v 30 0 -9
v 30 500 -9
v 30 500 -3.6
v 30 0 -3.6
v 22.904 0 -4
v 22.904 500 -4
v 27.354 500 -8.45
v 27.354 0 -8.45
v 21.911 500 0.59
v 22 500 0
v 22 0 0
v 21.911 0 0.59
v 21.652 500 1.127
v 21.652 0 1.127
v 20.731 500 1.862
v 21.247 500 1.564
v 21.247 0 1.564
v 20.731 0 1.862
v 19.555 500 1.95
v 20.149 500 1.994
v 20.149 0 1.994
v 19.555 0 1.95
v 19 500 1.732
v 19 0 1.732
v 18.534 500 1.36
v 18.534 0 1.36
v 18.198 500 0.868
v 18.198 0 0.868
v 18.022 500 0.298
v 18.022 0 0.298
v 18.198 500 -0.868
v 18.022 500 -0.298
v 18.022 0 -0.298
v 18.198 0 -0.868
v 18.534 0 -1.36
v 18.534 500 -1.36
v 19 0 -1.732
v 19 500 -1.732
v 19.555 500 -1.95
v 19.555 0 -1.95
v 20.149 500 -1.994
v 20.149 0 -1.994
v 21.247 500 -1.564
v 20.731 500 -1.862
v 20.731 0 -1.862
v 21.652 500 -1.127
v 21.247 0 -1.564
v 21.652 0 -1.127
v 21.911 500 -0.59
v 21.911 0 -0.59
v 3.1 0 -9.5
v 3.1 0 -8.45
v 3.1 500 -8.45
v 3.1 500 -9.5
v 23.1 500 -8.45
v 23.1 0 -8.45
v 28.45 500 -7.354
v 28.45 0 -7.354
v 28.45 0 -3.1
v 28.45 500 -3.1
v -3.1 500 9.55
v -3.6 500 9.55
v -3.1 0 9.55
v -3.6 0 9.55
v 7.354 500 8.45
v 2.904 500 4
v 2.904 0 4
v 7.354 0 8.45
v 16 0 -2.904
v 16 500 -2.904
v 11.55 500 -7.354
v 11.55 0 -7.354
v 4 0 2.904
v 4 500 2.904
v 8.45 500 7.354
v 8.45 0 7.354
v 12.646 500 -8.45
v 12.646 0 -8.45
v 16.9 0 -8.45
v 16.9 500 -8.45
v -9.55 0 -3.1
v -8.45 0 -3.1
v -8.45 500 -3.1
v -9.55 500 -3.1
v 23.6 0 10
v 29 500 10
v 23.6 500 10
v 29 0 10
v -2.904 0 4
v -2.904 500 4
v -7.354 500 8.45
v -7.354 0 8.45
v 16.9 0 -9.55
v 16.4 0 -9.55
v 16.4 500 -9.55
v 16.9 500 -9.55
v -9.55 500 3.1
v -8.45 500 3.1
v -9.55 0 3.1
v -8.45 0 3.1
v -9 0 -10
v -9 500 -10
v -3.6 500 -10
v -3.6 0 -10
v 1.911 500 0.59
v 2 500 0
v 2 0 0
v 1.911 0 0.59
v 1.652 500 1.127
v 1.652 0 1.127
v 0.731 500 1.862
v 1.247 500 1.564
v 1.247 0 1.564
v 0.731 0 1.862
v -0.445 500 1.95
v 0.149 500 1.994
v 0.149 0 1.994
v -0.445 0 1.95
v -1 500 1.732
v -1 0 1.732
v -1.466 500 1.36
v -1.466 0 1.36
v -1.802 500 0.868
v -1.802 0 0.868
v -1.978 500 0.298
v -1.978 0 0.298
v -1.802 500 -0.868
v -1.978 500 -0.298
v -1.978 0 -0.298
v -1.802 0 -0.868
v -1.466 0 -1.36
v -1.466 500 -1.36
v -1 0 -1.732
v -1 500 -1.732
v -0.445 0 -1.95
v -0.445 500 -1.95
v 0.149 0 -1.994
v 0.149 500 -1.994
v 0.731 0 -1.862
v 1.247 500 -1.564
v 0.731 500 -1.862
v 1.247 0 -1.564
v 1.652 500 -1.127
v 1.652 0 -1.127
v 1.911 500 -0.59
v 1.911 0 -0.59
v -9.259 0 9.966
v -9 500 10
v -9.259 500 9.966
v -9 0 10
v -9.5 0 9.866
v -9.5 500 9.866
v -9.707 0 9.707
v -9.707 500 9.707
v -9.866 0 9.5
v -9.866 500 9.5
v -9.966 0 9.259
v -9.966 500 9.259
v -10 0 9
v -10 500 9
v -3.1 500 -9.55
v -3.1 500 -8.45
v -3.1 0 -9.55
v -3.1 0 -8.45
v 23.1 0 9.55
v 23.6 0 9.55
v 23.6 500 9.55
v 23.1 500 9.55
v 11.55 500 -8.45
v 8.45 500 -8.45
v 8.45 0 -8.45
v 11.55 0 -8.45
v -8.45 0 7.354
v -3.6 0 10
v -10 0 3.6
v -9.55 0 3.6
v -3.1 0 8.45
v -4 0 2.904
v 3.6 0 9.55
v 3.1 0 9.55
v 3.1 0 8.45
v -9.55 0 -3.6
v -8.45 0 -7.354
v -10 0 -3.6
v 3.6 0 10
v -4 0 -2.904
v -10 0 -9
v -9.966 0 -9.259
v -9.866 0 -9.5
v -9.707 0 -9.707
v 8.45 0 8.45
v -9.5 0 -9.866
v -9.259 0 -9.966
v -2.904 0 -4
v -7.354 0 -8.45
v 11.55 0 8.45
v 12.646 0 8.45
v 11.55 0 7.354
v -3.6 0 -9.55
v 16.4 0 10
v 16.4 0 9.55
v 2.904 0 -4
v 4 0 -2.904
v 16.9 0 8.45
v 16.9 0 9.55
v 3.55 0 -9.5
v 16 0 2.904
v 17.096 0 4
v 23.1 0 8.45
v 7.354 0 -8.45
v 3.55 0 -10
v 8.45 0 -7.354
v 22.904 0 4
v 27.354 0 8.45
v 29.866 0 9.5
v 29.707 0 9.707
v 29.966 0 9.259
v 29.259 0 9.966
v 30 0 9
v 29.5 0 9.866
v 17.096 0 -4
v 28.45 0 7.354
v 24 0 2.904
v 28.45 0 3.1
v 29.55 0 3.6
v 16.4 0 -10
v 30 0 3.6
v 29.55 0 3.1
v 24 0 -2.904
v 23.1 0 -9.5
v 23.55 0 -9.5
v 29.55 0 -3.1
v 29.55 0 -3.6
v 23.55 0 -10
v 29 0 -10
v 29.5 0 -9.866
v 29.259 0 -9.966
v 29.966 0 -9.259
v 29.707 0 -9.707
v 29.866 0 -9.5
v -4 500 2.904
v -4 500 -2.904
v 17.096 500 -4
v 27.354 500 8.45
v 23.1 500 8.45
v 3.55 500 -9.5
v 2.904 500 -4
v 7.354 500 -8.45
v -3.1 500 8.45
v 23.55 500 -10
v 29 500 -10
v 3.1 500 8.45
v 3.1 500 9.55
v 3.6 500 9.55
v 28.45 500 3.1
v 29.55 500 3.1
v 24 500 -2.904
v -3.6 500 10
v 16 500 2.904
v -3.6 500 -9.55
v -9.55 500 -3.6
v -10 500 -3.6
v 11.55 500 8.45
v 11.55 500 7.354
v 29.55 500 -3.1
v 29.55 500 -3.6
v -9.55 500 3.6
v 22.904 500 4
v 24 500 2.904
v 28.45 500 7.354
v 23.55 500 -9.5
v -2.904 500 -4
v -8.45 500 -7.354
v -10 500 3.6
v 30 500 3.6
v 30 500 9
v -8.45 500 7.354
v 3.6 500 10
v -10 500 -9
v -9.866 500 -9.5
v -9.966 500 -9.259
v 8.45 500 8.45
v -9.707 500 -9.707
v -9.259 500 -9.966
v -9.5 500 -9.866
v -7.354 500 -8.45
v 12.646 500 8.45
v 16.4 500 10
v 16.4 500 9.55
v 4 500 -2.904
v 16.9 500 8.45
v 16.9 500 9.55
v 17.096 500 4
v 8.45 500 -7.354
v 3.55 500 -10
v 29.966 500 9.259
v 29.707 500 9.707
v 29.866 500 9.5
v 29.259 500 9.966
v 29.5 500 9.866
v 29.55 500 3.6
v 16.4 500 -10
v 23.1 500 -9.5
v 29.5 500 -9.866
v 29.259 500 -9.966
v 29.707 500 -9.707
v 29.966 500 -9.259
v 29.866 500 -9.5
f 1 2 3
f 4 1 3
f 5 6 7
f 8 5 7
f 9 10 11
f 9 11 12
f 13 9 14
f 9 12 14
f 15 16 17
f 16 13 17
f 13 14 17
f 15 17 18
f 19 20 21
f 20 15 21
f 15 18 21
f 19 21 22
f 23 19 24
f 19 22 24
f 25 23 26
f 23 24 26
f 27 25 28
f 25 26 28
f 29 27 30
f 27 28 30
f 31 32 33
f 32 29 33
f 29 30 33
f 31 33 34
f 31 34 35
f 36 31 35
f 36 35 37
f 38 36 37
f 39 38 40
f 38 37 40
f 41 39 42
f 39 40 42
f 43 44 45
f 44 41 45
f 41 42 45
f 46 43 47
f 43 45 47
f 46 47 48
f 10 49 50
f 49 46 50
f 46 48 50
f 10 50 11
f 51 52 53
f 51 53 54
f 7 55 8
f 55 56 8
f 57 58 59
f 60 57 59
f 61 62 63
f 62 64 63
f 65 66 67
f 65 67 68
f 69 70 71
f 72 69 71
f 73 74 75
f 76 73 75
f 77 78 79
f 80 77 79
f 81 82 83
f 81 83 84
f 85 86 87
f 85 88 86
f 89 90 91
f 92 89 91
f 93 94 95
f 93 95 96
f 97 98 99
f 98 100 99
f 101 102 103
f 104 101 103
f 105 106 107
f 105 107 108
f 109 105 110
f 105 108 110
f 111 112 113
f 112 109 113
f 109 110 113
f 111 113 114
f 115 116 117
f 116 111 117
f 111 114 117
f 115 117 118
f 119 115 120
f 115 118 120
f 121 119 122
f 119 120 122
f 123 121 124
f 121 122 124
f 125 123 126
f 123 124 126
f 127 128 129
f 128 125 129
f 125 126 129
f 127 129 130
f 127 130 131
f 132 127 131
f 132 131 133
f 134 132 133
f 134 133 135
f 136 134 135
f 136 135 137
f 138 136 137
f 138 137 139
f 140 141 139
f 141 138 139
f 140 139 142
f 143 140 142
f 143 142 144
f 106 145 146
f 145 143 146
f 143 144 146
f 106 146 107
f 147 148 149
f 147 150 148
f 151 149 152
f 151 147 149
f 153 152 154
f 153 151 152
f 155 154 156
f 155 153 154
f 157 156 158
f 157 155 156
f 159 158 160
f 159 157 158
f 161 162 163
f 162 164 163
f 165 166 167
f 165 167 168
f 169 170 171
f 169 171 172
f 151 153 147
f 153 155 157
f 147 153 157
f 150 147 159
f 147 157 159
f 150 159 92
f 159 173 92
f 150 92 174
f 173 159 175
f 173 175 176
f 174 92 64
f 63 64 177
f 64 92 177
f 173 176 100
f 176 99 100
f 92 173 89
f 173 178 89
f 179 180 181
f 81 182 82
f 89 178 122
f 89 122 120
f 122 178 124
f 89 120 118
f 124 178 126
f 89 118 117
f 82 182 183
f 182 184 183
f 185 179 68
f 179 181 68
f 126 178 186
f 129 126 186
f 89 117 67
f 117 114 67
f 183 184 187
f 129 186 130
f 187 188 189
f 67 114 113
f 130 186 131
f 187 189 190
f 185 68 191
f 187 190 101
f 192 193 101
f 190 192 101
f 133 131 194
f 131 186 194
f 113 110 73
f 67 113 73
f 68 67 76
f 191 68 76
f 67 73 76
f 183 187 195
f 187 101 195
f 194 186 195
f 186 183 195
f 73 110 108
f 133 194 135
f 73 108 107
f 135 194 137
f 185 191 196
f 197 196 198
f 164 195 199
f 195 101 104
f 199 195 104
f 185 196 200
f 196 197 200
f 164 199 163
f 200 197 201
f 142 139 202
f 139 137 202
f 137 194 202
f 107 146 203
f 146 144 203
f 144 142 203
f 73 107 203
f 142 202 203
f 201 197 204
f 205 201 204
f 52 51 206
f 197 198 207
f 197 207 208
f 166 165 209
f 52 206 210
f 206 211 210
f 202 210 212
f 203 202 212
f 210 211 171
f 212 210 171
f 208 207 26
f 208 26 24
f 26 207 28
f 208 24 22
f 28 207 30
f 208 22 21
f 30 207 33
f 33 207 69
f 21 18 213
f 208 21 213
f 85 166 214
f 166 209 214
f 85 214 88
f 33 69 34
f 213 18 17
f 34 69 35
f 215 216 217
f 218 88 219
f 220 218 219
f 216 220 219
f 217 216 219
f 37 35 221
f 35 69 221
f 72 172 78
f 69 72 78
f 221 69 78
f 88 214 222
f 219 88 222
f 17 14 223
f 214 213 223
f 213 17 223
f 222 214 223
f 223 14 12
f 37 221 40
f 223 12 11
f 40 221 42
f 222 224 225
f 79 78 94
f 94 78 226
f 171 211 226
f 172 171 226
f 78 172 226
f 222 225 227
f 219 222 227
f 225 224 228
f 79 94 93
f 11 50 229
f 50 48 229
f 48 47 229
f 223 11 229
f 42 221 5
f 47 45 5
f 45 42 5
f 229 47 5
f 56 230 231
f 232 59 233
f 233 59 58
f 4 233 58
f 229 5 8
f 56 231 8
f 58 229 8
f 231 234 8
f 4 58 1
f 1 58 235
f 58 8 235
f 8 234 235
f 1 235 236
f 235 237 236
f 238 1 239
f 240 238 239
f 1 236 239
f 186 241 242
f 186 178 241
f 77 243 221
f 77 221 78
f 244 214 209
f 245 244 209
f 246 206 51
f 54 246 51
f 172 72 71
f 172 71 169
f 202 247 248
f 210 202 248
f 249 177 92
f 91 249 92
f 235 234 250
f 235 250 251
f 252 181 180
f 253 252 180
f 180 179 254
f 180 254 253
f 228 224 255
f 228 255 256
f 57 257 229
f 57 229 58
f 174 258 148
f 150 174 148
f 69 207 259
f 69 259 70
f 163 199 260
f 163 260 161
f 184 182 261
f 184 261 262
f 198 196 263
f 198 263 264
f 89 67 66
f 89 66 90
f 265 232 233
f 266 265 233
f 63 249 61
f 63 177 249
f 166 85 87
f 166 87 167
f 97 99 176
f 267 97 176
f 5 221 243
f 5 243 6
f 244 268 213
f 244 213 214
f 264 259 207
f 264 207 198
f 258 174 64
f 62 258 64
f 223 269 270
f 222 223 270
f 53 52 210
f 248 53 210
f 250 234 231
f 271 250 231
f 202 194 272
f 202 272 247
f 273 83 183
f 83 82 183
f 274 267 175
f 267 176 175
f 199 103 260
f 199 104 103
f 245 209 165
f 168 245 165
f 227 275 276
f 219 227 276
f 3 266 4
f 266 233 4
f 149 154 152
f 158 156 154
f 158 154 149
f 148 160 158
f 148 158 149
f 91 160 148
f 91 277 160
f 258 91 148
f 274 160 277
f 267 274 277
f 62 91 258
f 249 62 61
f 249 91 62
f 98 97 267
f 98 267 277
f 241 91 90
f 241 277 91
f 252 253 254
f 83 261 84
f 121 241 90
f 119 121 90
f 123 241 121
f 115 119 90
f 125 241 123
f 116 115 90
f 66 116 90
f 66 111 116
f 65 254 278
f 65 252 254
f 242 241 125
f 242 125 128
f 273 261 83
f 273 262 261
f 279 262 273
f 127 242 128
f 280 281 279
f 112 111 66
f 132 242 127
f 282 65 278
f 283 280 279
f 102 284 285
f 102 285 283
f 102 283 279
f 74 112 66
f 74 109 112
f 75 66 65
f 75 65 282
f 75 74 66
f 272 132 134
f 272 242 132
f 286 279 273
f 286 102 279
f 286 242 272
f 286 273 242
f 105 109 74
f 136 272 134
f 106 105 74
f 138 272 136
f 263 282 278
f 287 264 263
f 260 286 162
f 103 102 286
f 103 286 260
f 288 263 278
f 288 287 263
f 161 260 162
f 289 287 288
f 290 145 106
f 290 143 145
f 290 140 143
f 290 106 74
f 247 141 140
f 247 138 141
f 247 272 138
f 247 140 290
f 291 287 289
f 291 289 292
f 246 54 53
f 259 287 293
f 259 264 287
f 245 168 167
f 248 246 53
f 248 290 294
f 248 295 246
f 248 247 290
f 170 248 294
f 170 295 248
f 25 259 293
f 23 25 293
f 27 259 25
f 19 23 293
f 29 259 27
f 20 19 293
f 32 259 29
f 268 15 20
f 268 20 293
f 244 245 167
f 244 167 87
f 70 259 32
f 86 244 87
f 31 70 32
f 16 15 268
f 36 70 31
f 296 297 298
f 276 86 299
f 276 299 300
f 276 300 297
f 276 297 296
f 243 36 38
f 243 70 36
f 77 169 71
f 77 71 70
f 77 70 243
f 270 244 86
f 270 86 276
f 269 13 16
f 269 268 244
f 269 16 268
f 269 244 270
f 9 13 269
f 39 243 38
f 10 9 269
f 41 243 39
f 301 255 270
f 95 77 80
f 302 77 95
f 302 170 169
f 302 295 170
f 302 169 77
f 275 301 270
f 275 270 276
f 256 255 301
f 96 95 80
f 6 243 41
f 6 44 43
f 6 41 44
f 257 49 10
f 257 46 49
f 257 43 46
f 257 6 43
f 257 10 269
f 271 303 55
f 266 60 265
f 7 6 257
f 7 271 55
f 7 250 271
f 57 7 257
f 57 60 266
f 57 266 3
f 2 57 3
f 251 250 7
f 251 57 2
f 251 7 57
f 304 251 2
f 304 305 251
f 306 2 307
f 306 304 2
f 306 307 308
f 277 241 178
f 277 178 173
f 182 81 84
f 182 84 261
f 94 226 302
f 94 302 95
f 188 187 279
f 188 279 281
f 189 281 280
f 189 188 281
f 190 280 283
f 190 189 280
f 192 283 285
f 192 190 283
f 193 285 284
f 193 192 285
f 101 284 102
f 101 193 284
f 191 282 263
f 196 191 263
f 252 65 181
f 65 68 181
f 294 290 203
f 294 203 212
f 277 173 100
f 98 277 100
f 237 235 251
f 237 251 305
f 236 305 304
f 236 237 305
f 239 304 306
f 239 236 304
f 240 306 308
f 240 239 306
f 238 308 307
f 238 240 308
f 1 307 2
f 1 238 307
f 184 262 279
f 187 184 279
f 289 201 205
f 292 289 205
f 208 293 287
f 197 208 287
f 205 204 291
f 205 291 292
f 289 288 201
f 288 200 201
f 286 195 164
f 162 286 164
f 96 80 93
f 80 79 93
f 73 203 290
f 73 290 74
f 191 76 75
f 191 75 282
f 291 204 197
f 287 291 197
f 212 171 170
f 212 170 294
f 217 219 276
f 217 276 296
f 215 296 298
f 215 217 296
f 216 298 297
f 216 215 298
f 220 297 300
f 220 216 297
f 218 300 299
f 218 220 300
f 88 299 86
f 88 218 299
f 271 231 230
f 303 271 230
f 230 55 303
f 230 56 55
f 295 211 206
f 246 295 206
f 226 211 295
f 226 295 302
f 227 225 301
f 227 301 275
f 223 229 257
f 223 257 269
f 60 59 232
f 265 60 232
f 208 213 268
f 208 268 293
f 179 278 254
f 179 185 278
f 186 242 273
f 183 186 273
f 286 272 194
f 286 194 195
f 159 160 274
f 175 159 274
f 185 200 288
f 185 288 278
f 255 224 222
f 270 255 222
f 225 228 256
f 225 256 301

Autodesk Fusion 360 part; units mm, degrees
sketch "Sketch1" plane through (0, 0, 0) normal (0, 1, 0) x (1, 0, 0)
  line L0 (9, -10) -> (-9, -10)
  line L1 (-10, -9) -> (-10, 9)
  line L2 (-9, 10) -> (9, 10)
  line L3 (10, 9) -> (10, -9)
  line L4 (10, -10) -> (-10, 10) construction
  line L5 (-10, -10) -> (10, 10) construction
  line L6 (4, -4) -> (-4, -4)
  line L7 (-4, -4) -> (-4, 4)
  line L8 (-4, 4) -> (4, 4)
  line L9 (4, 4) -> (4, -4)
  line L10 (4, -4) -> (-4, 4) construction
  line L11 (-4, -4) -> (4, 4) construction
  circle A0 centre (0, 0) radius 2
  line L12 (8.45, -8.45) -> (-8.45, -8.45)
  line L13 (-8.45, -8.45) -> (-8.45, 8.45)
  line L14 (-8.45, 8.45) -> (8.45, 8.45)
  line L15 (8.45, 8.45) -> (8.45, -8.45)
  line L16 (8.45, -8.45) -> (-8.45, 8.45) construction
  line L17 (-8.45, -8.45) -> (8.45, 8.45) construction
  line L18 (-9.452, -10.548) -> (10.548, 9.452) construction
  line L19 (-10.548, -9.452) -> (9.452, 10.548) construction
  line L20 (10.548, -9.452) -> (-9.452, 10.548) construction
  line L21 (9.452, -10.548) -> (-10.548, 9.452) construction
  line L22 (3.1, -10) -> (-3.1, -10) construction
  line L23 (-3.1, -10) -> (-3.1, 10) construction
  line L24 (-3.1, 10) -> (3.1, 10) construction
  line L25 (3.1, 10) -> (3.1, -10) construction
  line L26 (10, -3.1) -> (-10, -3.1) construction
  line L27 (-10, -3.1) -> (-10, 3.1) construction
  line L28 (-10, 3.1) -> (10, 3.1) construction
  line L29 (10, 3.1) -> (10, -3.1) construction
  line L30 (-3.1, -8.45) -> (-3.1, -10)
  line L31 (3.1, -8.45) -> (3.1, -10)
  line L32 (-8.45, -3.1) -> (-10, -3.1)
  line L33 (-8.45, 3.1) -> (-10, 3.1)
  line L34 (8.45, -3.1) -> (10, -3.1)
  line L35 (8.45, 3.1) -> (10, 3.1)
  line L36 (-3.1, 8.45) -> (-3.1, 10)
  line L37 (3.1, 8.45) -> (3.1, 10)
  line L38 (-4, 2.904) -> (-8.45, 7.354)
  line L39 (-2.904, 4) -> (-7.354, 8.45)
  line L40 (2.904, 4) -> (7.354, 8.45)
  line L41 (4, 2.904) -> (8.45, 7.354)
  line L42 (-4, -2.904) -> (-8.45, -7.354)
  line L43 (-2.904, -4) -> (-7.354, -8.45)
  line L44 (2.904, -4) -> (7.354, -8.45)
  line L45 (4, -2.904) -> (8.45, -7.354)
  line L46 (-10, -3.1) -> (-9.55, -3.1)
  line L47 (-9.55, -3.1) -> (-9.55, -3.6)
  line L48 (-9.55, -3.6) -> (-10, -3.6)
  line L49 (-10, -3.6) -> (-10, -3.1)
  line L50 (-10, 3.1) -> (-9.55, 3.1)
  line L51 (-9.55, 3.1) -> (-9.55, 3.6)
  line L52 (-9.55, 3.6) -> (-10, 3.6)
  line L53 (-10, 3.6) -> (-10, 3.1)
  line L54 (-3.1, -10) -> (-3.6, -10)
  line L55 (-3.6, -10) -> (-3.6, -9.55)
  line L56 (-3.6, -9.55) -> (-3.1, -9.55)
  line L57 (-3.1, -9.55) -> (-3.1, -10)
  line L58 (3.1, -10) -> (3.6, -10)
  line L59 (3.6, -10) -> (3.6, -9.55)
  line L60 (3.6, -9.55) -> (3.1, -9.55)
  line L61 (3.1, -9.55) -> (3.1, -10)
  line L62 (10, -3.1) -> (9.55, -3.1)
  line L63 (9.55, -3.1) -> (9.55, -3.6)
  line L64 (9.55, -3.6) -> (10, -3.6)
  line L65 (10, -3.6) -> (10, -3.1)
  line L66 (10, 3.1) -> (9.55, 3.1)
  line L67 (9.55, 3.1) -> (9.55, 3.6)
  line L68 (9.55, 3.6) -> (10, 3.6)
  line L69 (10, 3.6) -> (10, 3.1)
  line L70 (-3.1, 10) -> (-3.6, 10)
  line L71 (-3.6, 10) -> (-3.6, 9.55)
  line L72 (-3.6, 9.55) -> (-3.1, 9.55)
  line L73 (-3.1, 9.55) -> (-3.1, 10)
  line L74 (3.1, 10) -> (3.55, 10)
  line L75 (3.55, 10) -> (3.55, 9.5)
  line L76 (3.55, 9.5) -> (3.1, 9.5)
  line L77 (3.1, 9.5) -> (3.1, 10)
  arc A1 (-10, -9) -> (-9, -10) centre (-9, -9) ccw
  arc A2 (9, -10) -> (10, -9) centre (9, -9) ccw
  arc A3 (10, 9) -> (9, 10) centre (9, 9) ccw
  arc A4 (-9, 10) -> (-10, 9) centre (-9, 9) ccw
  arc A5 (29, -10) -> (30, -9) centre (29, -9) ccw
  line L78 (30, -3.1) -> (10, -3.1) construction
  line L79 (30, 9) -> (30, -9)
  line L80 (24, 4) -> (24, -4)
  line L81 (29.452, -10.548) -> (9.452, 9.452) construction
  line L82 (30, 3.1) -> (29.55, 3.1)
  line L83 (29, -10) -> (11, -10)
  line L84 (16, 4) -> (24, 4)
  line L85 (24, -4) -> (16, 4) construction
  line L86 (28.45, -8.45) -> (11.55, -8.45)
  circle A6 centre (20, 0) radius 2
  line L87 (10, -9) -> (10, 9)
  line L88 (10, -3.1) -> (10, 3.1) construction
  line L89 (16.9, 8.45) -> (16.9, 10)
  arc A7 (11, 10) -> (10, 9) centre (11, 9) ccw
  line L90 (17.096, -4) -> (12.646, -8.45)
  line L91 (16.9, -8.45) -> (16.9, -10)
  line L92 (16.4, -9.55) -> (16.9, -9.55)
  line L93 (10, -3.1) -> (10.45, -3.1)
  line L94 (10, 3.1) -> (10.45, 3.1)
  line L95 (10.45, 3.1) -> (10.45, 3.6)
  arc A8 (10, -9) -> (11, -10) centre (11, -9) ccw
  line L96 (10.45, -3.1) -> (10.45, -3.6)
  line L97 (16.9, -10) -> (16.9, 10) construction
  line L98 (10.45, -3.6) -> (10, -3.6)
  line L99 (29.55, 3.1) -> (29.55, 3.6)
  line L100 (16, -4) -> (16, 4)
  line L101 (23.1, -9.55) -> (23.1, -10)
  line L102 (28.45, -3.1) -> (30, -3.1)
  line L103 (30, -3.6) -> (30, -3.1)
  line L104 (22.904, -4) -> (27.354, -8.45)
  line L105 (22.904, 4) -> (27.354, 8.45)
  line L106 (23.1, 10) -> (23.1, -10) construction
  line L107 (16, -2.904) -> (11.55, -7.354)
  line L108 (16, 2.904) -> (11.55, 7.354)
  line L109 (16.4, 10) -> (16.4, 9.55)
  line L110 (17.096, 4) -> (12.646, 8.45)
  line L111 (10, -3.6) -> (10, -3.1)
  line L112 (16.9, -9.55) -> (16.9, -10)
  line L113 (23.1, 9.5) -> (23.1, 10)
  line L114 (23.6, -10) -> (23.6, -9.55)
  line L115 (10.45, 3.6) -> (10, 3.6)
  line L116 (24, -2.904) -> (28.45, -7.354)
  line L117 (23.55, 10) -> (23.55, 9.5)
  line L118 (10, 3.6) -> (10, 3.1)
  line L119 (11.55, 3.1) -> (10, 3.1)
  line L120 (11.55, -8.45) -> (11.55, 8.45)
  line L121 (23.1, -10) -> (23.6, -10)
  line L122 (11.55, -3.1) -> (10, -3.1)
  line L123 (29.55, -3.6) -> (30, -3.6)
  line L124 (16.4, 9.55) -> (16.9, 9.55)
  line L125 (23.1, 10) -> (23.55, 10)
  line L126 (16.9, 10) -> (16.4, 10)
  line L127 (16.4, -10) -> (16.4, -9.55)
  line L128 (10, 3.1) -> (30, 3.1) construction
  line L129 (24, 2.904) -> (28.45, 7.354)
  line L130 (23.55, 9.5) -> (23.1, 9.5)
  line L131 (23.1, -8.45) -> (23.1, -10)
  line L132 (16.9, 9.55) -> (16.9, 10)
  line L133 (23.1, -10) -> (16.9, -10) construction
  line L134 (30, -3.1) -> (29.55, -3.1)
  line L135 (30.548, -9.452) -> (10.548, 10.548) construction
  line L136 (23.6, -9.55) -> (23.1, -9.55)
  line L137 (29.55, -3.1) -> (29.55, -3.6)
  line L138 (16.9, 10) -> (23.1, 10) construction
  line L139 (30, 3.1) -> (30, -3.1) construction
  line L140 (23.1, 8.45) -> (23.1, 10)
  line L141 (16.9, -10) -> (16.4, -10)
  line L142 (24, -4) -> (16, -4)
  line L143 (16, -4) -> (24, 4) construction
  line L144 (10, -10) -> (30, 10) construction
  arc A9 (30, 9) -> (29, 10) centre (29, 9) ccw
  line L145 (11, 10) -> (29, 10)
  line L146 (28.45, 8.45) -> (28.45, -8.45)
  line L147 (9.452, -9.452) -> (29.452, 10.548) construction
  line L148 (30, 3.6) -> (30, 3.1)
  line L149 (28.45, 3.1) -> (30, 3.1)
  line L150 (11.55, -8.45) -> (28.45, 8.45) construction
  line L151 (11.55, 8.45) -> (28.45, 8.45)
  line L152 (29.55, 3.6) -> (30, 3.6)
  line L153 (30, -10) -> (10, 10) construction
  line L154 (28.45, -8.45) -> (11.55, 8.45) construction
  line L155 (10.548, -10.548) -> (30.548, 9.452) construction
  line L156 (9, -10) -> (11, -10)
  line L157 (9, 10) -> (11, 10)
  line L158 (8.45, -8.45) -> (11.55, -8.45)
  line L159 (8.45, 8.45) -> (11.55, 8.45)
  point P0 (20, 0)
  point P1 (20, 0)
  point P2 (20, 0)
  point P3 (20, 0)
  point P4 (20, 0)
  point P5 (20, 0)
  dimension "d1" = 20
  dimension "d2" = 20
  dimension "d3" = 8
  dimension "d4" = 8
  dimension "d5" = 4
  dimension "d6" = 16.9
  dimension "d7" = 16.9
  dimension "d8" = 0.775
  dimension "d9" = -0.775
  dimension "d10" = 0.775
  dimension "d11" = -0.775
  dimension "d12" = 6.2
  dimension "d13" = 20
  dimension "d14" = 20
  dimension "d15" = 6.2
  dimension "d16" = 1.55
  dimension "d17" = 1.55
  dimension "d18" = 1.55
  dimension "d19" = 1.55
  dimension "d20" = 1.55
  dimension "d21" = 1.55
  dimension "d22" = 1.55
  dimension "d23" = 1.55
  dimension "d24" = 0.45
  dimension "d25" = 0.5
  dimension "d26" = 0.45
  dimension "d27" = 0.5
  dimension "d28" = 0.5
  dimension "d29" = 0.45
  dimension "d30" = 0.5
  dimension "d31" = 0.45
  dimension "d32" = 0.45
  dimension "d33" = 0.5
  dimension "d34" = 0.45
  dimension "d35" = 0.5
  dimension "d36" = 0.5
  dimension "d37" = 0.45
  dimension "d38" = 0.45
  dimension "d39" = 0.5
  dimension "d40" = 1
  dimension "d41" = 1
  dimension "d42" = 1
  dimension "d43" = 1
  dimension "d48" = 0.775
  dimension "d49" = -0.775
  dimension "d50" = 0.775
  dimension "d51" = -0.775
  dimension "d52" = 20
  dimension "d53" = 20
  dimension "d54" = 8
  dimension "d55" = 8
  dimension "d56" = 4
  dimension "d57" = 16.9
  dimension "d58" = 16.9
  dimension "d59" = 6.2
  dimension "d60" = 20
  dimension "d61" = 20
  dimension "d62" = 6.2
  dimension "d63" = 1.55
  dimension "d64" = 1.55
  dimension "d65" = 1.55
  dimension "d66" = 1.55
  dimension "d67" = 1.55
  dimension "d68" = 1.55
  dimension "d69" = 1.55
  dimension "d70" = 1.55
  dimension "d71" = 0.45
  dimension "d72" = 0.5
  dimension "d73" = 0.45
  dimension "d74" = 0.5
  dimension "d75" = 0.5
  dimension "d76" = 0.45
  dimension "d77" = 0.5
  dimension "d78" = 0.45
  dimension "d79" = 0.45
  dimension "d80" = 0.5
  dimension "d81" = 0.45
  dimension "d82" = 0.5
  dimension "d83" = 0.5
  dimension "d84" = 0.45
  dimension "d85" = 0.45
  dimension "d86" = 0.5
  dimension "d87" = 1
  dimension "d88" = 1
  dimension "d89" = 1
  dimension "d90" = 1
extrude "Extrude2" add sketch "Sketch1" along normal blind 500 contours L0 L3 L12 L31 L59 L60 A2 L87 L158 | A2 A8 L156 | L3 L83 L86 L87 L91 L92 A8 L127 L158 | L6 L9 L12 L15 L44 L45 | L86 L90 L100 L107 L120 L142 | L0 L1 L12 L13 L30 L32 L47 L48 L55 L56 A1 | L6 L7 L8 L9 | L80 L84 L100 L142 | A5 L79 L83 L86 L102 L114 L123 L131 L136 L137 L146 | L6 L7 L12 L13 L42 L43 | L8 L9 L14 L15 L40 L41 | L80 L86 L104 L116 L142 L146 | L84 L100 L108 L110 L120 L151 | L2 L3 L14 L37 L75 L76 A3 L87 L159 | L3 L87 L89 A7 L109 L124 L145 L151 L159 | A3 A7 L157 | L7 L8 L13 L14 L38 L39 | L80 L84 L105 L129 L146 L151 | L1 L2 L13 L14 L33 L36 L51 L52 L71 L72 A4 | L79 L99 L117 L130 L140 A9 L145 L146 L149 L151 L152
equation "d6 = 20 mm - ( ( 1.55 * 2 ) * 1 mm )"
equation "d7 = 20 mm - ( ( 1.55 * 2 ) * 1 mm )"
equation "d8 = ( 1.55 / 2 ) * 1 mm"
equation "d9 = ( -1.55 / 2 ) * 1 mm"
equation "d10 = ( 1.55 / 2 ) * 1 mm"
equation "d11 = ( -1.55 / 2 ) * 1 mm"
equation "d48 = ( 1.55 / 2 ) * 1 mm"
equation "d49 = ( -1.55 / 2 ) * 1 mm"
equation "d50 = ( 1.55 / 2 ) * 1 mm"
equation "d51 = ( -1.55 / 2 ) * 1 mm"
equation "d57 = 20 mm - ( ( 1.55 * 2 ) * 1 mm )"
equation "d58 = 20 mm - ( ( 1.55 * 2 ) * 1 mm )"
